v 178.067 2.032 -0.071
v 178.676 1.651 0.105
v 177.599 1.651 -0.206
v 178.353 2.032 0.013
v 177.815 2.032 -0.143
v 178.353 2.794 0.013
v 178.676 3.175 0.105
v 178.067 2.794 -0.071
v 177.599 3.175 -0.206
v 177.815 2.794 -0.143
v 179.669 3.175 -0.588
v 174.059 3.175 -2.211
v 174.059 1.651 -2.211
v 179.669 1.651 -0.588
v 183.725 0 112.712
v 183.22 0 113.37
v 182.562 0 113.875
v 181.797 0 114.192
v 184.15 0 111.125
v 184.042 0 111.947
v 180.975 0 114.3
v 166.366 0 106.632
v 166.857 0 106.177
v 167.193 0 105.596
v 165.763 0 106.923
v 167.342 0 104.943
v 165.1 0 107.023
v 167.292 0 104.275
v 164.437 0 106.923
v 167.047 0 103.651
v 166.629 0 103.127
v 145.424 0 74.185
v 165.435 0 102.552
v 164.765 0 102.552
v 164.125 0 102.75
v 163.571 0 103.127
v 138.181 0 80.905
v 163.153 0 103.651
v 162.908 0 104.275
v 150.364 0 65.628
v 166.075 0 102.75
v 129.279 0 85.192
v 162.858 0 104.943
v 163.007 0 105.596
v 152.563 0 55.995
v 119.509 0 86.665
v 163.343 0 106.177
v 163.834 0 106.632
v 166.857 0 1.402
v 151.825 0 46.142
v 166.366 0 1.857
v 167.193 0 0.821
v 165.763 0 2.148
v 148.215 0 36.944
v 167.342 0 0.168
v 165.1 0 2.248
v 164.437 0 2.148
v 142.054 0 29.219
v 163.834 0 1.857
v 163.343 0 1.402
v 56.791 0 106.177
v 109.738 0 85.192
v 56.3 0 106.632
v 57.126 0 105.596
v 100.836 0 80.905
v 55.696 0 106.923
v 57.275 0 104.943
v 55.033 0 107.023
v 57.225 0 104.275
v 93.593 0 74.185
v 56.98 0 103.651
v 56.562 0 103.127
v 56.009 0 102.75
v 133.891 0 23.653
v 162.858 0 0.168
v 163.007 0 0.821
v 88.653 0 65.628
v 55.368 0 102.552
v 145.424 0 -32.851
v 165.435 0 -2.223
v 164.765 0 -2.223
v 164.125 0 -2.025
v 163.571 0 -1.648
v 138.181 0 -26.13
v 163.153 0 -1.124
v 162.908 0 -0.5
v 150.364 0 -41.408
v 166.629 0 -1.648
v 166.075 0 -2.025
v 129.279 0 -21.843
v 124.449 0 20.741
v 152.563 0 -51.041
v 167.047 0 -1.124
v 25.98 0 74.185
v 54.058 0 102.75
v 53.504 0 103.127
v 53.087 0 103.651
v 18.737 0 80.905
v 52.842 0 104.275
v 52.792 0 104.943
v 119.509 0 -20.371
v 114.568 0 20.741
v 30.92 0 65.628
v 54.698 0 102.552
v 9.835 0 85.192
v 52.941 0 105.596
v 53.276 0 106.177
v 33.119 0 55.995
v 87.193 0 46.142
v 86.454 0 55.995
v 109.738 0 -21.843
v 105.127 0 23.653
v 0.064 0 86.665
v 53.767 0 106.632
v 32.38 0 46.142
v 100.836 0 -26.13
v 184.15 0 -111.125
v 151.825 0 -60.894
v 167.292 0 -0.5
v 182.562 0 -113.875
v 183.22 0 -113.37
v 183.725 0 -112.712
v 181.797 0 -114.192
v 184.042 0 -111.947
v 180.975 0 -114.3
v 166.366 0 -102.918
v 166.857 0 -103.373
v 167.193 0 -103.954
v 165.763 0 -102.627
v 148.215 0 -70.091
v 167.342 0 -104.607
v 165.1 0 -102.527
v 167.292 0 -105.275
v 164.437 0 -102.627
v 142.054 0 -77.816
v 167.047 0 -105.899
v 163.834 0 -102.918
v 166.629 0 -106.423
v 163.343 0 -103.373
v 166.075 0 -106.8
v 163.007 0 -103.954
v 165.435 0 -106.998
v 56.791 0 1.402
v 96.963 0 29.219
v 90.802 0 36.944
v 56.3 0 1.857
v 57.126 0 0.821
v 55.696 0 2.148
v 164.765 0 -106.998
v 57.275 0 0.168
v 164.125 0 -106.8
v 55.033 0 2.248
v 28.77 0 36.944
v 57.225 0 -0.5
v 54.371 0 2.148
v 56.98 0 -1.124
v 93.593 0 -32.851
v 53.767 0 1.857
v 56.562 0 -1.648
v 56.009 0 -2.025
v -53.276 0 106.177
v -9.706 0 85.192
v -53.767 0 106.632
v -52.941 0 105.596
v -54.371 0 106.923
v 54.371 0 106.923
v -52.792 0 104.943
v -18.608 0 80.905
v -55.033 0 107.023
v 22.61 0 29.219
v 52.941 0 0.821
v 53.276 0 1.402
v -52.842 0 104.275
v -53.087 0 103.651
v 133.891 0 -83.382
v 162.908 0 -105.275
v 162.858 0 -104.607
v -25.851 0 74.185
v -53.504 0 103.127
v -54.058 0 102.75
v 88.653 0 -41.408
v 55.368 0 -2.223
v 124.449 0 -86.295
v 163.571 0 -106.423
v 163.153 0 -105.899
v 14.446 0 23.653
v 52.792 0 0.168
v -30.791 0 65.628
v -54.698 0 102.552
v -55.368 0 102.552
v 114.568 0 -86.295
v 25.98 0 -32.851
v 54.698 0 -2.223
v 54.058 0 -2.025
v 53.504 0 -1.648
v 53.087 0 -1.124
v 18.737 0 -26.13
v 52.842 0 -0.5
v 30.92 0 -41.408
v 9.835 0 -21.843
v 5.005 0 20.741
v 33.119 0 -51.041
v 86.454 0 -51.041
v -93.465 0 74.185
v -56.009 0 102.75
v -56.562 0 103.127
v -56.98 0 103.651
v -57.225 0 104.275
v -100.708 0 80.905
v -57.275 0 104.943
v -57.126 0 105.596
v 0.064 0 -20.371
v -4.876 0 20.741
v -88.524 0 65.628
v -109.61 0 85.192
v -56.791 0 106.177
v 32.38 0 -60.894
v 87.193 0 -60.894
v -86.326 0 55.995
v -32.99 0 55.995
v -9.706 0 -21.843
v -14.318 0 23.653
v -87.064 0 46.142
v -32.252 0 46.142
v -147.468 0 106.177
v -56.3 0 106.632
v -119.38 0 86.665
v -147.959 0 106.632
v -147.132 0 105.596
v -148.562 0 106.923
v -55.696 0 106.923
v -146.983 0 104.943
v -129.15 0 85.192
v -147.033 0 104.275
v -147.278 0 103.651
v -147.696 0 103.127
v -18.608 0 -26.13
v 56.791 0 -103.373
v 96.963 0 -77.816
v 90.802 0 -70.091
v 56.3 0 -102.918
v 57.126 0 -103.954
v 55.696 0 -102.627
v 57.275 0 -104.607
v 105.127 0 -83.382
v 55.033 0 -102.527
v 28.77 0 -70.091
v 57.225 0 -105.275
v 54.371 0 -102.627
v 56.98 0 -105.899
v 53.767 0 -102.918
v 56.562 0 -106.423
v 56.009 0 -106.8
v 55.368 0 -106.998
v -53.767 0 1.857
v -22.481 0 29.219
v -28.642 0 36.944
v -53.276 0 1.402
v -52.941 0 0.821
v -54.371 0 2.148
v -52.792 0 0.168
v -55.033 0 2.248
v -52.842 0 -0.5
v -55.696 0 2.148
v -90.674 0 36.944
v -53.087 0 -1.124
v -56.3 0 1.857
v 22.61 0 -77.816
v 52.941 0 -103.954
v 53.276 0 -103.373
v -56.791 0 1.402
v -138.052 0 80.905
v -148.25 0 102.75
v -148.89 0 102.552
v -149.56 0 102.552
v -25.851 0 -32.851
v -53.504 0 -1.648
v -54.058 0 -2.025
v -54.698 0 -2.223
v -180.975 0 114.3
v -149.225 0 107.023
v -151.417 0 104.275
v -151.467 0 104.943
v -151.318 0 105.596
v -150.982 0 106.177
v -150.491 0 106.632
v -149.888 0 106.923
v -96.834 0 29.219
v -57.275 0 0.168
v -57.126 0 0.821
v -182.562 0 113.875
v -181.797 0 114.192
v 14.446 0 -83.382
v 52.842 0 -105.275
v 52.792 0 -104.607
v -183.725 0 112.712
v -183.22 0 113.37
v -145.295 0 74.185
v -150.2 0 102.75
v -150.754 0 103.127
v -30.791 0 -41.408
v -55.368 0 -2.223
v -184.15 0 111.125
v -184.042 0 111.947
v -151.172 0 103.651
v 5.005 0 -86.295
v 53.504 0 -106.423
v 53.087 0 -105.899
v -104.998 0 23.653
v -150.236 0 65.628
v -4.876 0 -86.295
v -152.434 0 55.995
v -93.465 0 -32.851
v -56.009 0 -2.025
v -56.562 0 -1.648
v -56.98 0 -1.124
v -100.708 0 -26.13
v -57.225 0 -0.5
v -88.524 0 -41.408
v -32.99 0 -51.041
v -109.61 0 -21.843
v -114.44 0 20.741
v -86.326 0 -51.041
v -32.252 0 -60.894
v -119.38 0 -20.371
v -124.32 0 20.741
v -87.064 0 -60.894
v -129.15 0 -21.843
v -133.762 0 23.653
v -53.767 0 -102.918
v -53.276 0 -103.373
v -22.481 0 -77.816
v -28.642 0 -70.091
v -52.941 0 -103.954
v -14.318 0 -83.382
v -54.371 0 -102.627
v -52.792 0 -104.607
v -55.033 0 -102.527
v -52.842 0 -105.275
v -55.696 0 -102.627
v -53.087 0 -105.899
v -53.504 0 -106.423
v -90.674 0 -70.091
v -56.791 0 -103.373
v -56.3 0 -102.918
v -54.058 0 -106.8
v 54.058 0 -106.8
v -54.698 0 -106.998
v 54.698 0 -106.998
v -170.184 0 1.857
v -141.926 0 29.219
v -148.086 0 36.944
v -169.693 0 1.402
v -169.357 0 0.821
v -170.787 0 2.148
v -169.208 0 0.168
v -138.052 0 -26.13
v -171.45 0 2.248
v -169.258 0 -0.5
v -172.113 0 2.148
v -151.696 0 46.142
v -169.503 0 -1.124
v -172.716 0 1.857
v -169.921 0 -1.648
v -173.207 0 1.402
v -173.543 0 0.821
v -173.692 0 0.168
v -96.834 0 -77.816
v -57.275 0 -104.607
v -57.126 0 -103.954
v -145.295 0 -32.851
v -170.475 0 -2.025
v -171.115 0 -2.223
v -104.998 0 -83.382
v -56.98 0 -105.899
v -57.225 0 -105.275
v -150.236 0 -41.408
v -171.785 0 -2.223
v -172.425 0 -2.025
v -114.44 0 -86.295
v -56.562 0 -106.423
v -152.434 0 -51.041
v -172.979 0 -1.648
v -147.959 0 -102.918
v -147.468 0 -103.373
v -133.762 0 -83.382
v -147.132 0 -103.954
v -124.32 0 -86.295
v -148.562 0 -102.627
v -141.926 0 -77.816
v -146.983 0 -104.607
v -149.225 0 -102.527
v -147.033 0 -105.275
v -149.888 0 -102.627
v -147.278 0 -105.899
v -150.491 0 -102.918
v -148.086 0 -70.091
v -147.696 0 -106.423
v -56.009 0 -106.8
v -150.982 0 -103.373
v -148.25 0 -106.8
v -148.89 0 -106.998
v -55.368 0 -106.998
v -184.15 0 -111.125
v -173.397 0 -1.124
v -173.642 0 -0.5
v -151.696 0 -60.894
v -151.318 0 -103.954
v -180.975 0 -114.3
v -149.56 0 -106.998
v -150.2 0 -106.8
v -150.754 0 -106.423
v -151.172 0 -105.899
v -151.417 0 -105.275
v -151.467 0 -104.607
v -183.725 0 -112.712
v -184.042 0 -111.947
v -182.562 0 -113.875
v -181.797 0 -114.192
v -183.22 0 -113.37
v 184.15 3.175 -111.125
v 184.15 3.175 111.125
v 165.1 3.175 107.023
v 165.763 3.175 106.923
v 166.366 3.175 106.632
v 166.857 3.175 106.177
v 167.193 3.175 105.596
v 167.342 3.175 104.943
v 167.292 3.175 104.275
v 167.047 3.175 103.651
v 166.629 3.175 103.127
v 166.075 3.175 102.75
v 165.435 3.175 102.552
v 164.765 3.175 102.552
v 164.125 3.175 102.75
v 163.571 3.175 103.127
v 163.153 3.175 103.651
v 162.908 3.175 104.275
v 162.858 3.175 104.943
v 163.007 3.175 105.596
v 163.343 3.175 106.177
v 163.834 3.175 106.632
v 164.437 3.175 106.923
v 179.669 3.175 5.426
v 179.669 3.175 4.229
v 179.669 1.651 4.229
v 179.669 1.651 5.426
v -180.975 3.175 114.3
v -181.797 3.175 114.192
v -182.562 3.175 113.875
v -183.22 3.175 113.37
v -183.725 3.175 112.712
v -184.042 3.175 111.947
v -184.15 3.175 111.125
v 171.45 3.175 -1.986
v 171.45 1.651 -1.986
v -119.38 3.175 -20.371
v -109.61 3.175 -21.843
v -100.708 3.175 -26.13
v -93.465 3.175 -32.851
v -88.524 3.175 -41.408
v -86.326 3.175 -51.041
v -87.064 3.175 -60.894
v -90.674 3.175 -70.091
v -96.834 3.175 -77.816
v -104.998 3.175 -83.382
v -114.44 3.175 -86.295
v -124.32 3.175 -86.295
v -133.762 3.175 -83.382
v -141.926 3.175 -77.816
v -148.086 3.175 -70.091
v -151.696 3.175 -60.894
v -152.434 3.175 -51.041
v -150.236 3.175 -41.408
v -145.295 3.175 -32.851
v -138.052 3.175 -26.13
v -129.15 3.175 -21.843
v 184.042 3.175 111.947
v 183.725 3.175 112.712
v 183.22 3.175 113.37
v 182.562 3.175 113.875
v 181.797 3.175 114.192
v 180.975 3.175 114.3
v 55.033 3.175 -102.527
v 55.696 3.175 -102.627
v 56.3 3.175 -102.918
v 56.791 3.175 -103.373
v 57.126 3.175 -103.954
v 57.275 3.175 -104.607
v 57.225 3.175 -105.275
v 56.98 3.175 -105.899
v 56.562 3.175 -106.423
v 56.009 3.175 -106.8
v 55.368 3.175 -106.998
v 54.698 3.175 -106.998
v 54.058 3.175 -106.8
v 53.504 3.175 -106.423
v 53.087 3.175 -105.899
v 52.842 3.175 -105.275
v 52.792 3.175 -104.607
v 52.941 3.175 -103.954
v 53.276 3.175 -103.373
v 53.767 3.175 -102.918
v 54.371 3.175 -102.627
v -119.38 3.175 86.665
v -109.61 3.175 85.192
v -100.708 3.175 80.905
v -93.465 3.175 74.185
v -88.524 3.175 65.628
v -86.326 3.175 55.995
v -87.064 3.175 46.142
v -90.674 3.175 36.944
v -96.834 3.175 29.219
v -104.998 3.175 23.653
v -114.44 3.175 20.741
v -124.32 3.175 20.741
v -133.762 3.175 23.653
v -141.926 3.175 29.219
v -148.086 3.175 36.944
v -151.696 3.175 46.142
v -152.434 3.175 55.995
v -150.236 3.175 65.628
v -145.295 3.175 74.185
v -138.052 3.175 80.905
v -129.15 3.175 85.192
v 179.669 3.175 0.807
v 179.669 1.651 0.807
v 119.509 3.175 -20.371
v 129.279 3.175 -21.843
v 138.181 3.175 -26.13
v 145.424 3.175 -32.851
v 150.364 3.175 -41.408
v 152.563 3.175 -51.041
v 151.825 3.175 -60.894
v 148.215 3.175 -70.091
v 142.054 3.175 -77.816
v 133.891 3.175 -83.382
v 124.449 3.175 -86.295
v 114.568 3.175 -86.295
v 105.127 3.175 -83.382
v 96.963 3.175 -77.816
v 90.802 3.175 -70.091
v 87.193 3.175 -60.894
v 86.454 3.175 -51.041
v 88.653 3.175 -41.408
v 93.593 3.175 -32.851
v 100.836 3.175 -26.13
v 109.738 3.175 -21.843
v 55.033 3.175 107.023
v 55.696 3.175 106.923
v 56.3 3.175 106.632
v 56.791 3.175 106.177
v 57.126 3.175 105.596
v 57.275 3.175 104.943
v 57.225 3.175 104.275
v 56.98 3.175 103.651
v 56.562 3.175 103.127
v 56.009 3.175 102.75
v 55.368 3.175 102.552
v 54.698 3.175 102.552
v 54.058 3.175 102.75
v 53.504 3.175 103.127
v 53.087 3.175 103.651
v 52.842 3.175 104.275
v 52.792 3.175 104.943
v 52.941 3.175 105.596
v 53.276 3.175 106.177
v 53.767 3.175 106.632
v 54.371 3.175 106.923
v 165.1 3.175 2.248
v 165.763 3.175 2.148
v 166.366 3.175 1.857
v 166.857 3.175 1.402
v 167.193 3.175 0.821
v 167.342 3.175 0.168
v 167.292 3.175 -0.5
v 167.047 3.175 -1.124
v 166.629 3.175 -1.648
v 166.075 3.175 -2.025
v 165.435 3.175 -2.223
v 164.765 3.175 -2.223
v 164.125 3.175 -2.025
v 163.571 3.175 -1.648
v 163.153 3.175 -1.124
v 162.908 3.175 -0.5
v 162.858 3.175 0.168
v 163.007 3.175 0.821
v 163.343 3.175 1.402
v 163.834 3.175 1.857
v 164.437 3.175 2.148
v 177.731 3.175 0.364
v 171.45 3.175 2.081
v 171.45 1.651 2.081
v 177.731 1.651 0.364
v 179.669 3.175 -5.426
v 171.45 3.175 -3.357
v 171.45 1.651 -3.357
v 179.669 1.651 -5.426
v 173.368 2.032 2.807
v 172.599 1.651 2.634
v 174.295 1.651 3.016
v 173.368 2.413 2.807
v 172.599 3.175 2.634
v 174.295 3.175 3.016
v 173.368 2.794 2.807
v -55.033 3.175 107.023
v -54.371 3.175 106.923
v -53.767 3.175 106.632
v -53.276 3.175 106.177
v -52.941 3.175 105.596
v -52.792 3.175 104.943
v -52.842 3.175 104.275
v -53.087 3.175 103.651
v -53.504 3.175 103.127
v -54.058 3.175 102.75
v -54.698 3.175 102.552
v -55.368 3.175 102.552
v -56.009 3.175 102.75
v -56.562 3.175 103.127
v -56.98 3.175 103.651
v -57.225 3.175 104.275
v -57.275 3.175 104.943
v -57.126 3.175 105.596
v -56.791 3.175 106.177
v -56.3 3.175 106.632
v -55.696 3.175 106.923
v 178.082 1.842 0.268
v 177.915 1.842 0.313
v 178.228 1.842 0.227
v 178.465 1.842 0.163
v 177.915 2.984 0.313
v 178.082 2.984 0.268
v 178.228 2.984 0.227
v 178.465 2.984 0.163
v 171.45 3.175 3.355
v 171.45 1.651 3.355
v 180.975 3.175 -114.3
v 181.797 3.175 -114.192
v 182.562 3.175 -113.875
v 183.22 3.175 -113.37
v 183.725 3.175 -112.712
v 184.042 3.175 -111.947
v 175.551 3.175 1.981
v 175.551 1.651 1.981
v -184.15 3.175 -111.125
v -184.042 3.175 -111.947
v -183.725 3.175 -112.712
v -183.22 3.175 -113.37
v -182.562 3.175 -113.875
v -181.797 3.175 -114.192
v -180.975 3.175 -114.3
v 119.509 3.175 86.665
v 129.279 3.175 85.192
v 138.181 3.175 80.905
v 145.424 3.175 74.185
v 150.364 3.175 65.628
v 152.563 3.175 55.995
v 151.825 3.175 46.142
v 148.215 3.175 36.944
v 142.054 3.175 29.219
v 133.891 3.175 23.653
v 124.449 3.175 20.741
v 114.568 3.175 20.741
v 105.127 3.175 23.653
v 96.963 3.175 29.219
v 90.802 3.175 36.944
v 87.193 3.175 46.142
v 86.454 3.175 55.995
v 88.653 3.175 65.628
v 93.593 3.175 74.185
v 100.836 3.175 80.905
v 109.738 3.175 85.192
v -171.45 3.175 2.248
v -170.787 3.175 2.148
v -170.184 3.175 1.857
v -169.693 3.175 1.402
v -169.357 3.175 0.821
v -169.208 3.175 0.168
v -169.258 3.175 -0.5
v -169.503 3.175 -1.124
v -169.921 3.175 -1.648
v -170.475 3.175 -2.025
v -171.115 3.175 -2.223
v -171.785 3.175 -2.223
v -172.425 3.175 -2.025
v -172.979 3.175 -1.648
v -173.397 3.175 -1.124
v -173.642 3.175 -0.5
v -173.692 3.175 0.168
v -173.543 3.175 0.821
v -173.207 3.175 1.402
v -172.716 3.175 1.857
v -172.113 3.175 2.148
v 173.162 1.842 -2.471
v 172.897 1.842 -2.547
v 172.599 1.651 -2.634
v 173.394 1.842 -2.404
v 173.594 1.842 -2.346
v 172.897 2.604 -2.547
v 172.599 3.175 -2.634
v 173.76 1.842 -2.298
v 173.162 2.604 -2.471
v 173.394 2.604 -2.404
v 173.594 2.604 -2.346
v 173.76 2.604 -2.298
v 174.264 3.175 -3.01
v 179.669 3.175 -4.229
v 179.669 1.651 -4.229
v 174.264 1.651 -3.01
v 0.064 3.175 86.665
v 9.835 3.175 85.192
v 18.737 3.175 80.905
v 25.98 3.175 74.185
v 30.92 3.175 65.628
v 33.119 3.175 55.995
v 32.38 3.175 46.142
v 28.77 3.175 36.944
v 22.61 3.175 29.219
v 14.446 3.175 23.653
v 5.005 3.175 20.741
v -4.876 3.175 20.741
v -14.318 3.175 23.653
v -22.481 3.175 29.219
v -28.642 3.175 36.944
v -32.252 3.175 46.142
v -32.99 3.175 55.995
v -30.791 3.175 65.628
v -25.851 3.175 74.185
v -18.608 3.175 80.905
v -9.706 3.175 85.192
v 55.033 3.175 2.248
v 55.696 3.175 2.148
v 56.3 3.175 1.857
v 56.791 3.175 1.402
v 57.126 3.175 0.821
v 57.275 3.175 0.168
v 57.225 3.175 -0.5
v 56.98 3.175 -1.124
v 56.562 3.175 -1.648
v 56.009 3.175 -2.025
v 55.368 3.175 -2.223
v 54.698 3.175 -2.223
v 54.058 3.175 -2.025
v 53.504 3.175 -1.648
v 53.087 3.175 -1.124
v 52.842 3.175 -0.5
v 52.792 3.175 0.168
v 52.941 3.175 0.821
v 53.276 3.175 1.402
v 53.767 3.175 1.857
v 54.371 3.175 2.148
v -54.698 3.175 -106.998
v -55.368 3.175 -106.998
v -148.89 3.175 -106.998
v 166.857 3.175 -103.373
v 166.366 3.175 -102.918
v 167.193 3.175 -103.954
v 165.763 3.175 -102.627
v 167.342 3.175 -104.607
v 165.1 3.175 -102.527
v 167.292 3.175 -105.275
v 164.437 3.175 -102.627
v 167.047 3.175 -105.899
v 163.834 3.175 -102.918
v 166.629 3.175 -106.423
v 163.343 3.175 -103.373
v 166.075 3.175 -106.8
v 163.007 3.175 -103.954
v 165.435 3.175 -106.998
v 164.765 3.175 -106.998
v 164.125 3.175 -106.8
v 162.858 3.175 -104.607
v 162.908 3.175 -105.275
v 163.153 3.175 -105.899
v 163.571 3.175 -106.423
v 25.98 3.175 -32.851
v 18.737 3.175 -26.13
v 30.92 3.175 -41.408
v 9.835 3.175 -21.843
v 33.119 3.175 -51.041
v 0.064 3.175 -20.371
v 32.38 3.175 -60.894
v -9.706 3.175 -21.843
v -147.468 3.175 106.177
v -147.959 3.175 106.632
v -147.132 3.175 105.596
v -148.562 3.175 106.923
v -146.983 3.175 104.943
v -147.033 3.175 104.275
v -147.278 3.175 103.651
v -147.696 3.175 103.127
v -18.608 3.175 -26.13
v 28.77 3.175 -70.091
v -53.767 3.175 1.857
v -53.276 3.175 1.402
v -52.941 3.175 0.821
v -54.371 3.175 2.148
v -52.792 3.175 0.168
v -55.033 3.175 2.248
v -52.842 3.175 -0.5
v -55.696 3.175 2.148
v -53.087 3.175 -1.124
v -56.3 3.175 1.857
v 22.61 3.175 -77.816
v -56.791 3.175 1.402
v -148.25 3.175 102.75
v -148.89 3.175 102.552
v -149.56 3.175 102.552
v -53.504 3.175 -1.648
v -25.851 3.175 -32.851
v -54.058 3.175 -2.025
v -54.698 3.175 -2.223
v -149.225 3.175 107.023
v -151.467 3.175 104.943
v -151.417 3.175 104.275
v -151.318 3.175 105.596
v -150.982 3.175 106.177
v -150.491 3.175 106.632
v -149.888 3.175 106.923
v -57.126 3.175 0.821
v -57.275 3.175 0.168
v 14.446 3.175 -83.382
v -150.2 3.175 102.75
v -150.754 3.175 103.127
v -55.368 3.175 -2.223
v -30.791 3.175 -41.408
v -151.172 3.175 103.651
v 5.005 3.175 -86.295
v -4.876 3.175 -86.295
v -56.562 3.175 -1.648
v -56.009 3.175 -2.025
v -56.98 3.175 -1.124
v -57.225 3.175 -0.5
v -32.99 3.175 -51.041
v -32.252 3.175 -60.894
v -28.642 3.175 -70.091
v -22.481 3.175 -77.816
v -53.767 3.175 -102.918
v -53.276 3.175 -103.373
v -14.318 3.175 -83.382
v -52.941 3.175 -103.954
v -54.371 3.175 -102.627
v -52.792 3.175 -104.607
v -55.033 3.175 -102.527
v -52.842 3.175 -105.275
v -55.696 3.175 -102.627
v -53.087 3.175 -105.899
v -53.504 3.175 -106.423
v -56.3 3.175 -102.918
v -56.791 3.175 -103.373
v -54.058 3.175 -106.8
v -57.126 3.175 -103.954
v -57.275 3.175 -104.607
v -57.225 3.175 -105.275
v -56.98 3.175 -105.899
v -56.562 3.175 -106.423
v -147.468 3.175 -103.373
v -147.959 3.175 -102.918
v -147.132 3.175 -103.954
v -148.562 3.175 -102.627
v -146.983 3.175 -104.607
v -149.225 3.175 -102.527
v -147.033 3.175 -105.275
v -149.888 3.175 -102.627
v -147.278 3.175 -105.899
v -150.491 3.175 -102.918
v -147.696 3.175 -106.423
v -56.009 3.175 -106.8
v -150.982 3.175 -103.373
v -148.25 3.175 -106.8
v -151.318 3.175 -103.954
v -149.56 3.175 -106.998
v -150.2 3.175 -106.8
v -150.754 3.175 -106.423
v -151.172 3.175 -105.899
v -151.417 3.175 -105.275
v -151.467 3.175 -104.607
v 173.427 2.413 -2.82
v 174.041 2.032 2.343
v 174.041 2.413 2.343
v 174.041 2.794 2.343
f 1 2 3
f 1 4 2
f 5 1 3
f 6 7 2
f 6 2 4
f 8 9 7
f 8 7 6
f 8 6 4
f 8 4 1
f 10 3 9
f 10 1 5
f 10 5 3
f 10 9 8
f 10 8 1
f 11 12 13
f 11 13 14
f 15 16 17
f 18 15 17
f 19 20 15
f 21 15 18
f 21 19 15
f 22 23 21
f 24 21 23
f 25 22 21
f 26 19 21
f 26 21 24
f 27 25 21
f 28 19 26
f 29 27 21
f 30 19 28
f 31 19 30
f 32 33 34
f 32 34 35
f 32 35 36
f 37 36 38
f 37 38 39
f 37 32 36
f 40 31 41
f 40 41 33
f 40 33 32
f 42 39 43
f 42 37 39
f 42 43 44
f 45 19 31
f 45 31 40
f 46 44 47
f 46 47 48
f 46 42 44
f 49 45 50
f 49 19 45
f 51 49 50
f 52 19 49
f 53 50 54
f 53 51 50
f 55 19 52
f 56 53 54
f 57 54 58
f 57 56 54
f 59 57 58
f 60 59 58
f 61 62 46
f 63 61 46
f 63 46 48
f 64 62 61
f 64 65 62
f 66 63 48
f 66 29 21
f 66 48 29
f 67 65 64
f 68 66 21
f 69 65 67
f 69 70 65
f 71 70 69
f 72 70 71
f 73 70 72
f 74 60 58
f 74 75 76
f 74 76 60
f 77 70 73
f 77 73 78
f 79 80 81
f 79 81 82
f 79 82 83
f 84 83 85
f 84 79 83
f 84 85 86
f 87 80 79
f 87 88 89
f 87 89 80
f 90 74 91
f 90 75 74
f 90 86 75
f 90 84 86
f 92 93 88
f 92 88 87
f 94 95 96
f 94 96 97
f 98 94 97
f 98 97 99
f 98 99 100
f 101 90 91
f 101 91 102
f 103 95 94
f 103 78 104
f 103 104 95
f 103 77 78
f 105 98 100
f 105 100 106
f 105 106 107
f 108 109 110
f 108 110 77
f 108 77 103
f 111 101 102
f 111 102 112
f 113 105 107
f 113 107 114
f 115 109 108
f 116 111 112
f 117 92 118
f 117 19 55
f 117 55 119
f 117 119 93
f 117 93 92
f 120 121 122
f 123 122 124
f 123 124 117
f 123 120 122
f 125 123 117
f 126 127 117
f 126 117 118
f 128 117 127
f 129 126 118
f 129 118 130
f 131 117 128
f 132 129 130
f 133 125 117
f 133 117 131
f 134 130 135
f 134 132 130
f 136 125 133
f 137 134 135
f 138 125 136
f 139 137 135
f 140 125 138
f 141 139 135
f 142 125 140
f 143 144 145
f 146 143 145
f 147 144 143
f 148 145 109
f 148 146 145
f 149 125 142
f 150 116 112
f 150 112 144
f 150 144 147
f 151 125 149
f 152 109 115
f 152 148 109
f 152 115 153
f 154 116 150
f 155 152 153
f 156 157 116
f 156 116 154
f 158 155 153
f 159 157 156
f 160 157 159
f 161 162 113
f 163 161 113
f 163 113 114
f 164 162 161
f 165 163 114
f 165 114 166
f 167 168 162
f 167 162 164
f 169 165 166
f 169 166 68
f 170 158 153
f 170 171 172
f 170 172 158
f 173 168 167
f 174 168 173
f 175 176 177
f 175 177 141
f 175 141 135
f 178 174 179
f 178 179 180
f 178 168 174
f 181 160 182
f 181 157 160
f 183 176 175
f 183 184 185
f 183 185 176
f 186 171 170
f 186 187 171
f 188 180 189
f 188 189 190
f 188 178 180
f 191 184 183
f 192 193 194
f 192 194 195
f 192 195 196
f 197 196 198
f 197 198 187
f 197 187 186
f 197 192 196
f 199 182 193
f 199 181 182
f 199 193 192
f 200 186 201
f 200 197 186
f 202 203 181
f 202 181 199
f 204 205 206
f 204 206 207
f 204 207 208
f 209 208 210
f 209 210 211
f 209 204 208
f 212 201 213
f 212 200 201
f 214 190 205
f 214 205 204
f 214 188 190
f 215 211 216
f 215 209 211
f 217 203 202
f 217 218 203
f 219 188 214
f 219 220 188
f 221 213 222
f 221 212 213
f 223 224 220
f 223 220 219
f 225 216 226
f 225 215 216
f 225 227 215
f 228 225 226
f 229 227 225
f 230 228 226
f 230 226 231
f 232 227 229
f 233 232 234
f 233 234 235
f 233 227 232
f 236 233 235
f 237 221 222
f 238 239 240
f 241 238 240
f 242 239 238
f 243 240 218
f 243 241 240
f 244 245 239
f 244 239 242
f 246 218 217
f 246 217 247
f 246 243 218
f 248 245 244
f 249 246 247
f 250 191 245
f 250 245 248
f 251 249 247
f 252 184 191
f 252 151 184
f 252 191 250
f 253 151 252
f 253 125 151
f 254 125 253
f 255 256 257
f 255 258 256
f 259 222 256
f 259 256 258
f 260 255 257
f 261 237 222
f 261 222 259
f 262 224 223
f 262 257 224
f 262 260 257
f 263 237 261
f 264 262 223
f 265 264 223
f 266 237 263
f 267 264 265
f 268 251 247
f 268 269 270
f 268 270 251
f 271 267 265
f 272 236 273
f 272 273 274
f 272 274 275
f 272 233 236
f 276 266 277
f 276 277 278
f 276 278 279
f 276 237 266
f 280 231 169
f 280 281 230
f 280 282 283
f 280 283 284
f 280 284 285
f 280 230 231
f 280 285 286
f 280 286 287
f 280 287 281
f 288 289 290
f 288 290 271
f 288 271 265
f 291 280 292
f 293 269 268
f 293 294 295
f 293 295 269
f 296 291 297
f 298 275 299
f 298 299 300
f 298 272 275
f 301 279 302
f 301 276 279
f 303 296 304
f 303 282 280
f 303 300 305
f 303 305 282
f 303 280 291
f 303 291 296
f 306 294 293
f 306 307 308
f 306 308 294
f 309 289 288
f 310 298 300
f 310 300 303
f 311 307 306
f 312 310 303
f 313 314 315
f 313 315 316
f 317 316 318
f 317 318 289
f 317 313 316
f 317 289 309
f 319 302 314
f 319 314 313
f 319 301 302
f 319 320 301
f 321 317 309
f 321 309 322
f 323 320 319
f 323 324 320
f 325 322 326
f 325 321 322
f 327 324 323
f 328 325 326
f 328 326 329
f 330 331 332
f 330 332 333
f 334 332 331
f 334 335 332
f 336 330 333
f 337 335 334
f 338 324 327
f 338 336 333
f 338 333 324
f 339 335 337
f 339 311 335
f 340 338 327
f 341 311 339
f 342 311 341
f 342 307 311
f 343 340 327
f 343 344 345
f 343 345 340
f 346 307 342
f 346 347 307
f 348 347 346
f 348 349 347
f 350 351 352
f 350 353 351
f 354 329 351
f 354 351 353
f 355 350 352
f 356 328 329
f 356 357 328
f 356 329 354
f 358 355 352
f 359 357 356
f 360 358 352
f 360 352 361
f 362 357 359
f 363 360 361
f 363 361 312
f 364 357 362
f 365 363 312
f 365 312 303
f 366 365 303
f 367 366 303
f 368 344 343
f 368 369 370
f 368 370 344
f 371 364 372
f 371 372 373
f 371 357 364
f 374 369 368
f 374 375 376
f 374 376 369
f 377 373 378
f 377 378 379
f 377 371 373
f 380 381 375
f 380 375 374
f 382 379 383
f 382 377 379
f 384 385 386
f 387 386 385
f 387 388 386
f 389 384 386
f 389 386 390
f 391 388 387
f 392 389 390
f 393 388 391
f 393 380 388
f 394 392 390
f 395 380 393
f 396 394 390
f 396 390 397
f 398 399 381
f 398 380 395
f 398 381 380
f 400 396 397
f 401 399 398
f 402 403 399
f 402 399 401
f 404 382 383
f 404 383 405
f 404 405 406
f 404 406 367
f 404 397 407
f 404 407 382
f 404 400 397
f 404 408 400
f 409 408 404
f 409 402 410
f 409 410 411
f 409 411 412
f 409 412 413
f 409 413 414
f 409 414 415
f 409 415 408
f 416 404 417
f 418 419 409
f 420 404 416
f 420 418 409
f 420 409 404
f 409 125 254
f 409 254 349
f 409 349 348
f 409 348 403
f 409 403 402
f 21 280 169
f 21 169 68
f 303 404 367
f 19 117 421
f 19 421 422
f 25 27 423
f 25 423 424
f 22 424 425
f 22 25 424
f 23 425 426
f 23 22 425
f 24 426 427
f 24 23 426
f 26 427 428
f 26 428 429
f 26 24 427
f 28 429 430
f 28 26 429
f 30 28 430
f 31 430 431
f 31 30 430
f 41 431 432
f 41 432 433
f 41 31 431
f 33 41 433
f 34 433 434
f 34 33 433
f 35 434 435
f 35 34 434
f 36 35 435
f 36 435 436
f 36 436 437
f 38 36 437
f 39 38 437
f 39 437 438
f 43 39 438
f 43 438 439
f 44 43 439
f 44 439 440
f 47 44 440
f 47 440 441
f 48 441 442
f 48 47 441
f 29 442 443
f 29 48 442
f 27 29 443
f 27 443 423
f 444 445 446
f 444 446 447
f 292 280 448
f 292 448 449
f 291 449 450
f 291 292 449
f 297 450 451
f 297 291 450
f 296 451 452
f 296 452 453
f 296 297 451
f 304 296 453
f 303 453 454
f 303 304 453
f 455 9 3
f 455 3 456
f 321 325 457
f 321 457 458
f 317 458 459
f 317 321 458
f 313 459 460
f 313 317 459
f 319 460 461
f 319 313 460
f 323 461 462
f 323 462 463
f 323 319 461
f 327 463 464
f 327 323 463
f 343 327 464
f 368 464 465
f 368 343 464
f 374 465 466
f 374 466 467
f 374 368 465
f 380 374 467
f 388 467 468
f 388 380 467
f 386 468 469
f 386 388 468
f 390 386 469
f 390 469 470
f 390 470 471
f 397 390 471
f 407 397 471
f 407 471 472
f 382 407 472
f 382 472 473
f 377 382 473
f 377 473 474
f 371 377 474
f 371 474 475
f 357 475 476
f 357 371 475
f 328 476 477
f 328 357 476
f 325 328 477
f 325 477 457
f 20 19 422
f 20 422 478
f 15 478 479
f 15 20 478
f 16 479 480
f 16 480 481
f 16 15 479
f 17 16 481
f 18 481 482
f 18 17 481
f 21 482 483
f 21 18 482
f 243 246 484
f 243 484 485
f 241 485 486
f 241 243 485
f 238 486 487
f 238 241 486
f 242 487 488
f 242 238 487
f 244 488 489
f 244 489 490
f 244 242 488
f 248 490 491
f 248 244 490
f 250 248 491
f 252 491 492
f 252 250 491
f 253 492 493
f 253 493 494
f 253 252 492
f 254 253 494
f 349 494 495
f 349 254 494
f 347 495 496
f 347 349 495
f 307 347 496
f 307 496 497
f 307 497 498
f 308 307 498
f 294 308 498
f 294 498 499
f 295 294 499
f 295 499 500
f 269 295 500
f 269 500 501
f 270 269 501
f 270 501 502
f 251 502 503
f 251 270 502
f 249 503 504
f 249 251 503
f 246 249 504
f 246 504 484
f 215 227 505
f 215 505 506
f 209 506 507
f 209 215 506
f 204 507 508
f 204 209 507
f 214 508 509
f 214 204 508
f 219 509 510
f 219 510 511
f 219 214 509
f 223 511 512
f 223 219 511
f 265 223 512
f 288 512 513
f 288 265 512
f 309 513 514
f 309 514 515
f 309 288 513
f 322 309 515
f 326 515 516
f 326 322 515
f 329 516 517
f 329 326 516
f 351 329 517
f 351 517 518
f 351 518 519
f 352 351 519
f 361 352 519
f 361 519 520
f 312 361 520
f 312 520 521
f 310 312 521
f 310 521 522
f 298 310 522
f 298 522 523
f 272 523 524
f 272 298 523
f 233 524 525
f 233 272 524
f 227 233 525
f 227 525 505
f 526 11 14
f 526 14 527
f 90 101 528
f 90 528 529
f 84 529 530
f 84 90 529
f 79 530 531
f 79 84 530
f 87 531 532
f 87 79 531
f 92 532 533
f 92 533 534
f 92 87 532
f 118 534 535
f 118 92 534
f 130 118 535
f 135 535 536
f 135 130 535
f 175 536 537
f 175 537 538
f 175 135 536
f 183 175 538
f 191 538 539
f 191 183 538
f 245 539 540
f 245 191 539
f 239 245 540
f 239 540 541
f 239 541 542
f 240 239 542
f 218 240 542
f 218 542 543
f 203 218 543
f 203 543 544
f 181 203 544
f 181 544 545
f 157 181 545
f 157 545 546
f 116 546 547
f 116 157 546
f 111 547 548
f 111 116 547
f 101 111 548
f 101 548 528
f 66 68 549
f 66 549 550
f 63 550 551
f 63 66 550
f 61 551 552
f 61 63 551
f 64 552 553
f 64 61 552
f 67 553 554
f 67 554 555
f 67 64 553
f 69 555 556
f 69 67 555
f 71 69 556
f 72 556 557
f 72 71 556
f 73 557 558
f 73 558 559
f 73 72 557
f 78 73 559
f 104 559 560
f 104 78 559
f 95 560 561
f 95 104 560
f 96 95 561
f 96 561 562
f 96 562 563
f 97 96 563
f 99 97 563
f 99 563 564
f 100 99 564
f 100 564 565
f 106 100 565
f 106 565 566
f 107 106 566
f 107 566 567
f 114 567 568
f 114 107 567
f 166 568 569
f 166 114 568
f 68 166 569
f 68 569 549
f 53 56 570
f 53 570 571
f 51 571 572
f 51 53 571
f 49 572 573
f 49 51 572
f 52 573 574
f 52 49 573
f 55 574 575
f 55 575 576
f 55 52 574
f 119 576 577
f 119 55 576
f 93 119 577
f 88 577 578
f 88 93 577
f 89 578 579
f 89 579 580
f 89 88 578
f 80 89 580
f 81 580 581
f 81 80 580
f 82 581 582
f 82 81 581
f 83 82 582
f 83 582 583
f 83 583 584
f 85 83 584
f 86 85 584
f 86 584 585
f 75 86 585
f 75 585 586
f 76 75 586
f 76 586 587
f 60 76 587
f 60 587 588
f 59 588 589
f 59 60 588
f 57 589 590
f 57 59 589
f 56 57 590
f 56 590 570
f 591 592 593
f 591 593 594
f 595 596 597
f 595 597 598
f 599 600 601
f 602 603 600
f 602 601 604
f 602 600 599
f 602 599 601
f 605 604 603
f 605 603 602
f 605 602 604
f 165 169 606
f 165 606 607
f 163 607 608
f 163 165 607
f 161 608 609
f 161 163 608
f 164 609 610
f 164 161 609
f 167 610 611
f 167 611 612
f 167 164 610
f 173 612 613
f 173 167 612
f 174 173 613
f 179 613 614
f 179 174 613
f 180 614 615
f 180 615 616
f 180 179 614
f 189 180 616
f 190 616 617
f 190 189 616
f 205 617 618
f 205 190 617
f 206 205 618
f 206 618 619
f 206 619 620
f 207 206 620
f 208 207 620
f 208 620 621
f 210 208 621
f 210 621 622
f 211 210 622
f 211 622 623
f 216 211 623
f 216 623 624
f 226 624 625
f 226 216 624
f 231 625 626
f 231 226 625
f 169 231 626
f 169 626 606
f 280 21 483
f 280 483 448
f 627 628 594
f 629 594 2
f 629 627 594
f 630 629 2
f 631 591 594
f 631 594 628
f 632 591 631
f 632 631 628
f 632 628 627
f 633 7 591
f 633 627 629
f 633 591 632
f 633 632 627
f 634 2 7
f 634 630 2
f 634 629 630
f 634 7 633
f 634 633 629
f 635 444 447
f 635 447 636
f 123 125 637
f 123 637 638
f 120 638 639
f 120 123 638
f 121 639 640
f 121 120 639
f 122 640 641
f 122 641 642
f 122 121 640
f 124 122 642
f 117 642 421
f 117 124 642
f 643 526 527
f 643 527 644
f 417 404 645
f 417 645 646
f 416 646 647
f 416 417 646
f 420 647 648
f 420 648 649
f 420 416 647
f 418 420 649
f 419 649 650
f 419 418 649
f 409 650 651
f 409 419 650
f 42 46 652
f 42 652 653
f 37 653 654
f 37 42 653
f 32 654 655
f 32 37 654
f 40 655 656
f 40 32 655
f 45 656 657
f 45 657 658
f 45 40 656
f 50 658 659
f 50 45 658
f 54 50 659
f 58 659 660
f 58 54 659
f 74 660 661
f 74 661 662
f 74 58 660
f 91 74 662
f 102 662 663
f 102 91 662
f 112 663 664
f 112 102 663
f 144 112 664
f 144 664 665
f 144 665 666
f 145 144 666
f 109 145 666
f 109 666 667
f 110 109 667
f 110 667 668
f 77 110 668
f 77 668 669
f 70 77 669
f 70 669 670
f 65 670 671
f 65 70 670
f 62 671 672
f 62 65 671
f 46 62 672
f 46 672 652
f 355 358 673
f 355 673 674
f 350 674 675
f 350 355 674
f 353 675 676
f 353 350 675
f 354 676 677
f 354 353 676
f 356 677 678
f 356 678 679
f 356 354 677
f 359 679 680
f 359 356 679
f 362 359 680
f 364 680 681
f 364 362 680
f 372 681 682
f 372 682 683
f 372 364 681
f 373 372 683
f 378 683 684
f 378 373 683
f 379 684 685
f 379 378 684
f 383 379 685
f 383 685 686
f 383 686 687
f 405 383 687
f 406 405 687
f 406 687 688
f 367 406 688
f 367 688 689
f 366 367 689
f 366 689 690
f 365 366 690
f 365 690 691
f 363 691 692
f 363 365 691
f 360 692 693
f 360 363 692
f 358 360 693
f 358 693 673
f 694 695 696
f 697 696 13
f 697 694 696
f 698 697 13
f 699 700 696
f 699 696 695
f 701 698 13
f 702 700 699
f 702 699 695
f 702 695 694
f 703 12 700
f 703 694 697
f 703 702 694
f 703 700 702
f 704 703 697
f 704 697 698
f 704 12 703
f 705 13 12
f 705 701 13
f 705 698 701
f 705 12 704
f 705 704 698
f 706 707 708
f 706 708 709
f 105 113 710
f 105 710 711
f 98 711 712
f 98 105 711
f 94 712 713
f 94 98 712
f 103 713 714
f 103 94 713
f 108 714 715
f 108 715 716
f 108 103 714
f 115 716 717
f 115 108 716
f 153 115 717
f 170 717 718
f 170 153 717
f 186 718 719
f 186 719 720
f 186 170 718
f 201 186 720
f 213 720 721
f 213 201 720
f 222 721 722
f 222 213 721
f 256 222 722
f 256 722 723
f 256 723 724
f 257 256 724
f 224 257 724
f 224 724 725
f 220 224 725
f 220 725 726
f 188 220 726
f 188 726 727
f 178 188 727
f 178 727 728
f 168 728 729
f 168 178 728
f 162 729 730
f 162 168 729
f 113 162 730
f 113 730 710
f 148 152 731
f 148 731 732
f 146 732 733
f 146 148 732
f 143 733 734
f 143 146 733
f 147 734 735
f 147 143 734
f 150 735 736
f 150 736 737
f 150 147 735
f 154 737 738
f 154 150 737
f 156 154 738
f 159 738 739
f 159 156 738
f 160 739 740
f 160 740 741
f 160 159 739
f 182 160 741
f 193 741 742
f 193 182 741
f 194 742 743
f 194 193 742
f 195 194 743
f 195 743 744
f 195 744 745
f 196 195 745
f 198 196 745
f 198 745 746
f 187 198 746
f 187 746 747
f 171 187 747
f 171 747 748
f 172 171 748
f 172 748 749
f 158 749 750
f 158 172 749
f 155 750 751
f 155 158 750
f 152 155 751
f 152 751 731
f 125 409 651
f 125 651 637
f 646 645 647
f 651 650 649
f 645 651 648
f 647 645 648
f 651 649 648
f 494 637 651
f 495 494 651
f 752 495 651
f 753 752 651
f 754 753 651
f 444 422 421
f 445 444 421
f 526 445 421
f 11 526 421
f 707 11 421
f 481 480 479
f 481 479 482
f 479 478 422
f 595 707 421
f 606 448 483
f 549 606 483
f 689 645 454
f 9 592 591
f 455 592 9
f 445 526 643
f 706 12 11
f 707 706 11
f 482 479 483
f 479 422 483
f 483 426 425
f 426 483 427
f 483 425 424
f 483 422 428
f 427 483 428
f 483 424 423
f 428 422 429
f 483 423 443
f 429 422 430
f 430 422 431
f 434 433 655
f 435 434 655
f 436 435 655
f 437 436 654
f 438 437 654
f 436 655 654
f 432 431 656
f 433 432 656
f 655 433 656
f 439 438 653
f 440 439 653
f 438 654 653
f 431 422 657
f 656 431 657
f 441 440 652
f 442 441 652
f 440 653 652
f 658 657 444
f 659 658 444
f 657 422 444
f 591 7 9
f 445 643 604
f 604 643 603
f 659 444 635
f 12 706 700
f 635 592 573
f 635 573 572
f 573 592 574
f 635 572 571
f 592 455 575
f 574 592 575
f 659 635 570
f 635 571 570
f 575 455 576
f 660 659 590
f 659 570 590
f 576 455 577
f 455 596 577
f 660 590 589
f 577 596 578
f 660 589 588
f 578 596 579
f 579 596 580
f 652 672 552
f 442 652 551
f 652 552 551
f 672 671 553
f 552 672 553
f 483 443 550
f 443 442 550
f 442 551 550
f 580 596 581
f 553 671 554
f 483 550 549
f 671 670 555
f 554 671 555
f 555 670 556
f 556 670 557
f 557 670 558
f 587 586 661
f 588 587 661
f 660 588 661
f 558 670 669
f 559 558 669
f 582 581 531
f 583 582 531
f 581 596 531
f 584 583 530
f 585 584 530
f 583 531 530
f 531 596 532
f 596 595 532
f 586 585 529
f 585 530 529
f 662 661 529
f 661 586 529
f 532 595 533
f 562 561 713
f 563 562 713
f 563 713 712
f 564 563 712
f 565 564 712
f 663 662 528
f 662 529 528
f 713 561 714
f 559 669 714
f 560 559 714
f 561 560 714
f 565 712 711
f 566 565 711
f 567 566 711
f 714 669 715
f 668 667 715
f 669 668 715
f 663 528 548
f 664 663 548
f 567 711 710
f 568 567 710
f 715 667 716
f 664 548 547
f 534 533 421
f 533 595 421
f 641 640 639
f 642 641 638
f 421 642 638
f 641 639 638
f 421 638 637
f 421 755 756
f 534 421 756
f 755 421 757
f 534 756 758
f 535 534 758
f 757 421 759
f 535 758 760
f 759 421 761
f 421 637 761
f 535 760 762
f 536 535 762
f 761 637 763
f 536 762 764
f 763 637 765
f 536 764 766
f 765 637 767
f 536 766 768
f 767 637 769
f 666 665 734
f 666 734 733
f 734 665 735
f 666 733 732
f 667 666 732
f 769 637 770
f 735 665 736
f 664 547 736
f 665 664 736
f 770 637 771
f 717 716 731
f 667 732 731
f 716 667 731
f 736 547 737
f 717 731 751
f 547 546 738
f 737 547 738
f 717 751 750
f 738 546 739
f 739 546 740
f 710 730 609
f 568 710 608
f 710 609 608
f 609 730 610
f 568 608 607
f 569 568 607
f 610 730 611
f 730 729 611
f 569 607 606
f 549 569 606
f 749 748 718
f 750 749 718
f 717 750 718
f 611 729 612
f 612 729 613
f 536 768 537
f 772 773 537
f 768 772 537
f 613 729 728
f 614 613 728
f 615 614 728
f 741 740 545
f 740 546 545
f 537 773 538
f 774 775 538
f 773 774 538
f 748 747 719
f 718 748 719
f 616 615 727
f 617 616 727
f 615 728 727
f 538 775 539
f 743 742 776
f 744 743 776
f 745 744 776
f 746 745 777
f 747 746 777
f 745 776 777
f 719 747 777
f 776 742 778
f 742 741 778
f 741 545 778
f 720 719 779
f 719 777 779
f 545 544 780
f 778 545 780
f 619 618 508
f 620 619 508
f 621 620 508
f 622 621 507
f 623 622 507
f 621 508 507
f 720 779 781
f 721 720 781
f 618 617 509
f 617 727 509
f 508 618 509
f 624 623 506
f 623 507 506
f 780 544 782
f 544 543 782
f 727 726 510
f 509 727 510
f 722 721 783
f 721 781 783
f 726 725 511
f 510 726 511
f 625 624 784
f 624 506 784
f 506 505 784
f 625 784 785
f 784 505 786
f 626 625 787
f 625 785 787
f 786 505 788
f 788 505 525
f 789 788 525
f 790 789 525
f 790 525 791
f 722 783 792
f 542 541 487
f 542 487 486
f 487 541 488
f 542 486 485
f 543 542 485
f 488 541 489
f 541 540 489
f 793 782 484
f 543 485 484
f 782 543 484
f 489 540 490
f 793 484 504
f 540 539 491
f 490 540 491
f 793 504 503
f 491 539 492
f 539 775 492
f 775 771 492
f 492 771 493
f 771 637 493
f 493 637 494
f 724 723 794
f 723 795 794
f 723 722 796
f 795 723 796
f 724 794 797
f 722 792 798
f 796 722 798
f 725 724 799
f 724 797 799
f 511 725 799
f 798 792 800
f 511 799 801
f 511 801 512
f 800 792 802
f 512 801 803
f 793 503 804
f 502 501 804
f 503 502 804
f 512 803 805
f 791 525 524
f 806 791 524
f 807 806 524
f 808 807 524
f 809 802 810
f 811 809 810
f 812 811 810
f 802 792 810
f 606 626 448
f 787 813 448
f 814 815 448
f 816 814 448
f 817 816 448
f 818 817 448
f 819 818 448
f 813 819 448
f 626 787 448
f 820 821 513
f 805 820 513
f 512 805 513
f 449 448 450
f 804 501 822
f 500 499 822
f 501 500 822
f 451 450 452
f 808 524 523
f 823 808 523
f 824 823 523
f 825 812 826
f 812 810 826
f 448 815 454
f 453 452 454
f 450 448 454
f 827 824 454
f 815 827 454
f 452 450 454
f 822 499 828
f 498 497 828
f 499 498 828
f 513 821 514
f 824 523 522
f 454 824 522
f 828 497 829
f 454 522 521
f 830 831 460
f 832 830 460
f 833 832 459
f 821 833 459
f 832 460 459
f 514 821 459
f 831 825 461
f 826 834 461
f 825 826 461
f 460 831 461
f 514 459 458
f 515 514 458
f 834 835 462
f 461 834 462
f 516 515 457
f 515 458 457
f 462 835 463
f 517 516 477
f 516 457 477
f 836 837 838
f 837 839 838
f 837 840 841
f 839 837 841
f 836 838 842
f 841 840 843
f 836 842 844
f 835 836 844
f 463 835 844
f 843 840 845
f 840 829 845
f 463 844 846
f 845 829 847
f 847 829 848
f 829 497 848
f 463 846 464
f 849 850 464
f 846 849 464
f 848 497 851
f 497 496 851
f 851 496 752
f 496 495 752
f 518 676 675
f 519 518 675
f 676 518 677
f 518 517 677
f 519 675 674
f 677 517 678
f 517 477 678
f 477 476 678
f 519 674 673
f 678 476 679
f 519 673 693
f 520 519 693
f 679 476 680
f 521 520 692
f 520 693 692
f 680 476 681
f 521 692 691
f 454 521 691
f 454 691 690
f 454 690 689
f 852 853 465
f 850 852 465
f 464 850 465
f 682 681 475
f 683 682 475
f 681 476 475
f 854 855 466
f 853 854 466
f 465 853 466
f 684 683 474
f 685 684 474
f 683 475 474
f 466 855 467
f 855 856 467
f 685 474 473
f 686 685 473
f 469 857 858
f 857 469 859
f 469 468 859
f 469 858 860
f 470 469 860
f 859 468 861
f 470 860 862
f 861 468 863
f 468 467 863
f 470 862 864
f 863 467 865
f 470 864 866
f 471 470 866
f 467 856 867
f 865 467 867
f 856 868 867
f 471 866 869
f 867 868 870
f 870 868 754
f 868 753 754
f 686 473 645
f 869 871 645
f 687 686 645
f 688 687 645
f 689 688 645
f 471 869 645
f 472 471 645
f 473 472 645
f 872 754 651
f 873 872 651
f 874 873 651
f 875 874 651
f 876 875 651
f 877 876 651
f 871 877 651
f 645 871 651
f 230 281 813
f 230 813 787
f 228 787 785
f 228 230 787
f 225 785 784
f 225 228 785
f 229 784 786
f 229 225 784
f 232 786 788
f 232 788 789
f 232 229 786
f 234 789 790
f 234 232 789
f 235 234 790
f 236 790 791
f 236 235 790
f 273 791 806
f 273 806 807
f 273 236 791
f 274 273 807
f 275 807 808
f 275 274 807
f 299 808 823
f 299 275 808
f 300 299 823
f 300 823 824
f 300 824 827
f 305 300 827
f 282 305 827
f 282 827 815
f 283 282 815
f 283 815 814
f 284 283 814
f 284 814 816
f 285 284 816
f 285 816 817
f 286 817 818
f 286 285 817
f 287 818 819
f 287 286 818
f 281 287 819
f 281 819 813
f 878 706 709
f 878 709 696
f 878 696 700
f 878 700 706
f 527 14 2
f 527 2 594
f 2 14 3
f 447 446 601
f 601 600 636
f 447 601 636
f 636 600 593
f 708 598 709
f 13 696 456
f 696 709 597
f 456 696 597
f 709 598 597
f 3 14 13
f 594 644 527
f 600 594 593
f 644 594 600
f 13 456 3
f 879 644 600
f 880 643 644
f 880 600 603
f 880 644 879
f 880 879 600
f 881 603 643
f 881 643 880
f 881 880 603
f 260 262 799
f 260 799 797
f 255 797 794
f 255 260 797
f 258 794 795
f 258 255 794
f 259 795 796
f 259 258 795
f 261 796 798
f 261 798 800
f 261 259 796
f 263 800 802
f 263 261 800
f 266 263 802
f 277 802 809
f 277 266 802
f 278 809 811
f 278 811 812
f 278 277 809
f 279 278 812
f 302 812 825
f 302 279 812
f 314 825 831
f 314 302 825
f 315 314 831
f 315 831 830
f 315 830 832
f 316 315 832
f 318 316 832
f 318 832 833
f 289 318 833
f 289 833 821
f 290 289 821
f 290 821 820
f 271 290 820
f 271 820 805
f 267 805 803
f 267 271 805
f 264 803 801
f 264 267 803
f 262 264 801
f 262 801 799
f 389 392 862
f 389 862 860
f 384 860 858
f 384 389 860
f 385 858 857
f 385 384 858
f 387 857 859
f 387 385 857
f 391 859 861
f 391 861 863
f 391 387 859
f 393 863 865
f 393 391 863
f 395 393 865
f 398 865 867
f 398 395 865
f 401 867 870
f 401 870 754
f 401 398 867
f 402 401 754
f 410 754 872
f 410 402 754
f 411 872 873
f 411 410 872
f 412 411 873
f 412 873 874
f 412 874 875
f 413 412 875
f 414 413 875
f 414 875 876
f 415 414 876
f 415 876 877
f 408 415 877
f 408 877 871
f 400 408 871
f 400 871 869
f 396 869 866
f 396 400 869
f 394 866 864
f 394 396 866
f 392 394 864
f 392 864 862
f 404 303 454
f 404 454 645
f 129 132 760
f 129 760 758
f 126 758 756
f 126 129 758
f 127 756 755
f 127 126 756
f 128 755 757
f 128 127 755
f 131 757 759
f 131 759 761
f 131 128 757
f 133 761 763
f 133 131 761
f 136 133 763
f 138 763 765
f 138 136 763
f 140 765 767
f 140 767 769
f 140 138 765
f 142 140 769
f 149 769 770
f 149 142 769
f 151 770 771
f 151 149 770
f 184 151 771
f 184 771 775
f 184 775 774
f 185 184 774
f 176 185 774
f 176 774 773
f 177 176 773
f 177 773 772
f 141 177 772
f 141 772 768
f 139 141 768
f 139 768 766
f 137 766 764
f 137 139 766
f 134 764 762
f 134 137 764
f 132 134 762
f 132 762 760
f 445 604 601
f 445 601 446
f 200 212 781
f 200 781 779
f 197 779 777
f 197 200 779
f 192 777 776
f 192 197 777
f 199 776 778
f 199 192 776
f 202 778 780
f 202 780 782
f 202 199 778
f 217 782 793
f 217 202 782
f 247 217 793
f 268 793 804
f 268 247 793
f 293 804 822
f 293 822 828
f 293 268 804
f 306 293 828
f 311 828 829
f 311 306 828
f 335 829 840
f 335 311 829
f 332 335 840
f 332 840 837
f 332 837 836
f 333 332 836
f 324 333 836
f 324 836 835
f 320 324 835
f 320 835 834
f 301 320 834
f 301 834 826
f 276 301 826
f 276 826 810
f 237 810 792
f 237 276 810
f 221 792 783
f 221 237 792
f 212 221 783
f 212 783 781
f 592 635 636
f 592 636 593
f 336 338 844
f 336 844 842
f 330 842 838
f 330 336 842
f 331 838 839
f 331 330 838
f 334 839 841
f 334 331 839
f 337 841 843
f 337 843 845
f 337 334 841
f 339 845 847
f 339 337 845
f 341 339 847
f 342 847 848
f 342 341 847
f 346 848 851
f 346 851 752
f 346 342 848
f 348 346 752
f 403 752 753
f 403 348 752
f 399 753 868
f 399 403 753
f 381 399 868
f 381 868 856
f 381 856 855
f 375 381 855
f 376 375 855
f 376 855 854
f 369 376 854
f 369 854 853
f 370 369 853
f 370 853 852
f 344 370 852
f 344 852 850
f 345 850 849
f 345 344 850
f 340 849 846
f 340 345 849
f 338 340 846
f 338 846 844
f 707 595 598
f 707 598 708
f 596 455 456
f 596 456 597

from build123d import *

# Parameters (mm, degrees)
SKETCH1_R           = 33.147
SKETCH1_R_2         = 2.2479
BOSS_EXTRUDE1_DEPTH = 3.175
CUT_EXTRUDE1_DEPTH  = 1.524


with BuildPart() as part:
    # Sketch1 → Boss-Extrude1 (new body)
    with BuildSketch(Plane(origin=(0, 0, 0), x_dir=(1, 0, 0), z_dir=(0, 1, 0))):
        with BuildLine():
            Line((-180.975, 114.3), (180.975, 114.3))
            ThreePointArc((180.975, 114.3), (183.22006403, 113.37006403), (184.15, 111.125))
            Line((184.15, 111.125), (184.15, -111.125))
            ThreePointArc((184.15, -111.125), (183.22006403, -113.37006403), (180.975, -114.3))
            Line((180.975, -114.3), (-180.975, -114.3))
            ThreePointArc((-180.975, -114.3), (-183.22006403, -113.37006403), (-184.15, -111.125))
            Line((-184.15, -111.125), (-184.15, 111.125))
            ThreePointArc((-184.15, 111.125), (-183.22006403, 113.37006403), (-180.975, 114.3))
        make_face()
        with Locations(Location((119.508581684, -53.5178, 0), (0, 0, 270))):
            Circle(SKETCH1_R, mode=Mode.SUBTRACT)
        with Locations(Location((165.1, 0, 0), (0, 0, 270))):
            Circle(SKETCH1_R_2, mode=Mode.SUBTRACT)
        with Locations(Location((-171.45, 0, 0), (0, 0, 270))):
            Circle(SKETCH1_R_2, mode=Mode.SUBTRACT)
        with Locations(Location((-55.033333333, 0, 0), (0, 0, 270))):
            Circle(SKETCH1_R_2, mode=Mode.SUBTRACT)
        with Locations(Location((55.033333333, 0, 0), (0, 0, 270))):
            Circle(SKETCH1_R_2, mode=Mode.SUBTRACT)
        with Locations(Location((119.508581684, 53.5178, 0), (0, 0, 270))):
            Circle(SKETCH1_R, mode=Mode.SUBTRACT)
        with Locations(Location((0.064290842, 53.5178, 0), (0, 0, 270))):
            Circle(SKETCH1_R, mode=Mode.SUBTRACT)
        with Locations(Location((0.064290842, -53.5178, 0), (0, 0, 270))):
            Circle(SKETCH1_R, mode=Mode.SUBTRACT)
        with Locations(Location((-119.38, 53.5178, 0), (0, 0, 270))):
            Circle(SKETCH1_R, mode=Mode.SUBTRACT)
        with Locations(Location((-119.38, -53.5178, 0), (0, 0, 270))):
            Circle(SKETCH1_R, mode=Mode.SUBTRACT)
        with Locations(Location((-149.225, -104.775, 0), (0, 0, 270))):
            Circle(SKETCH1_R_2, mode=Mode.SUBTRACT)
        with Locations(Location((-55.033333333, -104.775, 0), (0, 0, 270))):
            Circle(SKETCH1_R_2, mode=Mode.SUBTRACT)
        with Locations(Location((55.033333333, -104.775, 0), (0, 0, 270))):
            Circle(SKETCH1_R_2, mode=Mode.SUBTRACT)
        with Locations(Location((165.1, -104.775, 0), (0, 0, 270))):
            Circle(SKETCH1_R_2, mode=Mode.SUBTRACT)
        with Locations(Location((-149.225, 104.775, 0), (0, 0, 270))):
            Circle(SKETCH1_R_2, mode=Mode.SUBTRACT)
        with Locations(Location((-55.033333333, 104.775, 0), (0, 0, 270))):
            Circle(SKETCH1_R_2, mode=Mode.SUBTRACT)
        with Locations(Location((55.033333333, 104.775, 0), (0, 0, 270))):
            Circle(SKETCH1_R_2, mode=Mode.SUBTRACT)
        with Locations(Location((165.1, 104.775, 0), (0, 0, 270))):
            Circle(SKETCH1_R_2, mode=Mode.SUBTRACT)
    extrude(amount=BOSS_EXTRUDE1_DEPTH)

    # Sketch2 → Cut-Extrude1 (cut)
    with BuildSketch(Plane(origin=(0, 3.175, 0), x_dir=(1, 0, 0), z_dir=(0, 1, 0))):
        with BuildLine():
            Line((171.45, 3.35692423), (179.668619792, 5.426396401))
            Line((179.668619792, 5.426396401), (179.668619792, 4.229494039))
            Line((179.668619792, 4.229494039), (174.263626046, 3.009542664))
            add(Edge.make_bspline(
                [(174.263626046, 3.009542664), (173.984868687, 2.946317196), (173.430199851, 2.82051174), (172.875222779, 2.696073098), (172.599157976, 2.63417301)],
                knots=[0, 0, 0, 0, 1.00513078, 2, 2, 2, 2], degree=3))
            add(Edge.make_bspline(
                [(172.599157976, 2.63417301), (172.698424046, 2.604865261), (172.8858203, 2.549537571), (173.151472547, 2.474745256), (173.383326442, 2.406813793), (173.582462852, 2.348939672), (173.749161553, 2.302079221), (173.881374159, 2.261620439), (173.981689825, 2.234044239), (174.036994185, 2.217702533), (174.059477638, 2.21105897)],
                knots=[0, 0, 0, 0, 1.633809233, 3.084334118, 4.356383392, 5.447555203, 6.357852567, 7.089694452, 7.629924063, 8, 8, 8, 8], degree=3))
            Line((174.059477638, 2.21105897), (179.668619792, 0.587749853))
            Line((179.668619792, 0.587749853), (179.668619792, -0.806715484))
            Line((179.668619792, -0.806715484), (175.551078105, -1.980568832))
            add(Edge.make_bspline(
                [(175.551078105, -1.980568832), (175.296712529, -2.045349191), (174.795158662, -2.173082039), (174.048075598, -2.342795744), (173.319116921, -2.49943607), (172.836990124, -2.589663839), (172.599157976, -2.63417301)],
                knots=[0, 0, 0, 0, 1.04154457, 2.053700482, 3.039894486, 4, 4, 4, 4], degree=3))
            add(Edge.make_bspline(
                [(172.599157976, -2.63417301), (172.720980898, -2.661645998), (172.977226876, -2.719433502), (173.381816931, -2.809933441), (173.825093055, -2.910447181), (174.134101714, -2.979956246), (174.294906851, -3.016128097)],
                knots=[0, 0, 0, 0, 0.862132589, 1.813435466, 2.862132822, 4, 4, 4, 4], degree=3))
            Line((174.294906851, -3.016128097), (179.668619792, -4.229494039))
            Line((179.668619792, -4.229494039), (179.668619792, -5.426396401))
            Line((179.668619792, -5.426396401), (171.45, -3.355277872))
            Line((171.45, -3.355277872), (171.45, -2.080996678))
            Line((171.45, -2.080996678), (177.730856271, -0.363845147))
            add(Edge.make_bspline(
                [(177.730856271, -0.363845147), (177.792257478, -0.346602472), (177.908896909, -0.31384781), (178.075345329, -0.27091412), (178.221729866, -0.228338076), (178.349942301, -0.194473031), (178.458690649, -0.165165669), (178.547656515, -0.139212748), (178.618581103, -0.122520526), (178.658892529, -0.110449487), (178.675865838, -0.10536692)],
                knots=[0, 0, 0, 0, 1.562239628, 2.967673567, 4.210417925, 5.296319877, 6.215971374, 6.969386481, 7.566055473, 8, 8, 8, 8], degree=3))
            add(Edge.make_bspline(
                [(178.675865838, -0.10536692), (178.568229296, -0.074892118), (178.364849129, -0.017309719), (178.078532422, 0.067967153), (177.826773257, 0.139523409), (177.671018148, 0.184870245), (177.599147621, 0.205794766)],
                knots=[0, 0, 0, 0, 1.197730334, 2.263121701, 3.198547257, 4, 4, 4, 4], degree=3))
            Line((177.599147621, 0.205794766), (171.45, 1.985507906))
            Line((171.45, 1.985507906), (171.45, 3.35692423))
        make_face()
    extrude(amount=-CUT_EXTRUDE1_DEPTH, mode=Mode.SUBTRACT)


solid = part.part
